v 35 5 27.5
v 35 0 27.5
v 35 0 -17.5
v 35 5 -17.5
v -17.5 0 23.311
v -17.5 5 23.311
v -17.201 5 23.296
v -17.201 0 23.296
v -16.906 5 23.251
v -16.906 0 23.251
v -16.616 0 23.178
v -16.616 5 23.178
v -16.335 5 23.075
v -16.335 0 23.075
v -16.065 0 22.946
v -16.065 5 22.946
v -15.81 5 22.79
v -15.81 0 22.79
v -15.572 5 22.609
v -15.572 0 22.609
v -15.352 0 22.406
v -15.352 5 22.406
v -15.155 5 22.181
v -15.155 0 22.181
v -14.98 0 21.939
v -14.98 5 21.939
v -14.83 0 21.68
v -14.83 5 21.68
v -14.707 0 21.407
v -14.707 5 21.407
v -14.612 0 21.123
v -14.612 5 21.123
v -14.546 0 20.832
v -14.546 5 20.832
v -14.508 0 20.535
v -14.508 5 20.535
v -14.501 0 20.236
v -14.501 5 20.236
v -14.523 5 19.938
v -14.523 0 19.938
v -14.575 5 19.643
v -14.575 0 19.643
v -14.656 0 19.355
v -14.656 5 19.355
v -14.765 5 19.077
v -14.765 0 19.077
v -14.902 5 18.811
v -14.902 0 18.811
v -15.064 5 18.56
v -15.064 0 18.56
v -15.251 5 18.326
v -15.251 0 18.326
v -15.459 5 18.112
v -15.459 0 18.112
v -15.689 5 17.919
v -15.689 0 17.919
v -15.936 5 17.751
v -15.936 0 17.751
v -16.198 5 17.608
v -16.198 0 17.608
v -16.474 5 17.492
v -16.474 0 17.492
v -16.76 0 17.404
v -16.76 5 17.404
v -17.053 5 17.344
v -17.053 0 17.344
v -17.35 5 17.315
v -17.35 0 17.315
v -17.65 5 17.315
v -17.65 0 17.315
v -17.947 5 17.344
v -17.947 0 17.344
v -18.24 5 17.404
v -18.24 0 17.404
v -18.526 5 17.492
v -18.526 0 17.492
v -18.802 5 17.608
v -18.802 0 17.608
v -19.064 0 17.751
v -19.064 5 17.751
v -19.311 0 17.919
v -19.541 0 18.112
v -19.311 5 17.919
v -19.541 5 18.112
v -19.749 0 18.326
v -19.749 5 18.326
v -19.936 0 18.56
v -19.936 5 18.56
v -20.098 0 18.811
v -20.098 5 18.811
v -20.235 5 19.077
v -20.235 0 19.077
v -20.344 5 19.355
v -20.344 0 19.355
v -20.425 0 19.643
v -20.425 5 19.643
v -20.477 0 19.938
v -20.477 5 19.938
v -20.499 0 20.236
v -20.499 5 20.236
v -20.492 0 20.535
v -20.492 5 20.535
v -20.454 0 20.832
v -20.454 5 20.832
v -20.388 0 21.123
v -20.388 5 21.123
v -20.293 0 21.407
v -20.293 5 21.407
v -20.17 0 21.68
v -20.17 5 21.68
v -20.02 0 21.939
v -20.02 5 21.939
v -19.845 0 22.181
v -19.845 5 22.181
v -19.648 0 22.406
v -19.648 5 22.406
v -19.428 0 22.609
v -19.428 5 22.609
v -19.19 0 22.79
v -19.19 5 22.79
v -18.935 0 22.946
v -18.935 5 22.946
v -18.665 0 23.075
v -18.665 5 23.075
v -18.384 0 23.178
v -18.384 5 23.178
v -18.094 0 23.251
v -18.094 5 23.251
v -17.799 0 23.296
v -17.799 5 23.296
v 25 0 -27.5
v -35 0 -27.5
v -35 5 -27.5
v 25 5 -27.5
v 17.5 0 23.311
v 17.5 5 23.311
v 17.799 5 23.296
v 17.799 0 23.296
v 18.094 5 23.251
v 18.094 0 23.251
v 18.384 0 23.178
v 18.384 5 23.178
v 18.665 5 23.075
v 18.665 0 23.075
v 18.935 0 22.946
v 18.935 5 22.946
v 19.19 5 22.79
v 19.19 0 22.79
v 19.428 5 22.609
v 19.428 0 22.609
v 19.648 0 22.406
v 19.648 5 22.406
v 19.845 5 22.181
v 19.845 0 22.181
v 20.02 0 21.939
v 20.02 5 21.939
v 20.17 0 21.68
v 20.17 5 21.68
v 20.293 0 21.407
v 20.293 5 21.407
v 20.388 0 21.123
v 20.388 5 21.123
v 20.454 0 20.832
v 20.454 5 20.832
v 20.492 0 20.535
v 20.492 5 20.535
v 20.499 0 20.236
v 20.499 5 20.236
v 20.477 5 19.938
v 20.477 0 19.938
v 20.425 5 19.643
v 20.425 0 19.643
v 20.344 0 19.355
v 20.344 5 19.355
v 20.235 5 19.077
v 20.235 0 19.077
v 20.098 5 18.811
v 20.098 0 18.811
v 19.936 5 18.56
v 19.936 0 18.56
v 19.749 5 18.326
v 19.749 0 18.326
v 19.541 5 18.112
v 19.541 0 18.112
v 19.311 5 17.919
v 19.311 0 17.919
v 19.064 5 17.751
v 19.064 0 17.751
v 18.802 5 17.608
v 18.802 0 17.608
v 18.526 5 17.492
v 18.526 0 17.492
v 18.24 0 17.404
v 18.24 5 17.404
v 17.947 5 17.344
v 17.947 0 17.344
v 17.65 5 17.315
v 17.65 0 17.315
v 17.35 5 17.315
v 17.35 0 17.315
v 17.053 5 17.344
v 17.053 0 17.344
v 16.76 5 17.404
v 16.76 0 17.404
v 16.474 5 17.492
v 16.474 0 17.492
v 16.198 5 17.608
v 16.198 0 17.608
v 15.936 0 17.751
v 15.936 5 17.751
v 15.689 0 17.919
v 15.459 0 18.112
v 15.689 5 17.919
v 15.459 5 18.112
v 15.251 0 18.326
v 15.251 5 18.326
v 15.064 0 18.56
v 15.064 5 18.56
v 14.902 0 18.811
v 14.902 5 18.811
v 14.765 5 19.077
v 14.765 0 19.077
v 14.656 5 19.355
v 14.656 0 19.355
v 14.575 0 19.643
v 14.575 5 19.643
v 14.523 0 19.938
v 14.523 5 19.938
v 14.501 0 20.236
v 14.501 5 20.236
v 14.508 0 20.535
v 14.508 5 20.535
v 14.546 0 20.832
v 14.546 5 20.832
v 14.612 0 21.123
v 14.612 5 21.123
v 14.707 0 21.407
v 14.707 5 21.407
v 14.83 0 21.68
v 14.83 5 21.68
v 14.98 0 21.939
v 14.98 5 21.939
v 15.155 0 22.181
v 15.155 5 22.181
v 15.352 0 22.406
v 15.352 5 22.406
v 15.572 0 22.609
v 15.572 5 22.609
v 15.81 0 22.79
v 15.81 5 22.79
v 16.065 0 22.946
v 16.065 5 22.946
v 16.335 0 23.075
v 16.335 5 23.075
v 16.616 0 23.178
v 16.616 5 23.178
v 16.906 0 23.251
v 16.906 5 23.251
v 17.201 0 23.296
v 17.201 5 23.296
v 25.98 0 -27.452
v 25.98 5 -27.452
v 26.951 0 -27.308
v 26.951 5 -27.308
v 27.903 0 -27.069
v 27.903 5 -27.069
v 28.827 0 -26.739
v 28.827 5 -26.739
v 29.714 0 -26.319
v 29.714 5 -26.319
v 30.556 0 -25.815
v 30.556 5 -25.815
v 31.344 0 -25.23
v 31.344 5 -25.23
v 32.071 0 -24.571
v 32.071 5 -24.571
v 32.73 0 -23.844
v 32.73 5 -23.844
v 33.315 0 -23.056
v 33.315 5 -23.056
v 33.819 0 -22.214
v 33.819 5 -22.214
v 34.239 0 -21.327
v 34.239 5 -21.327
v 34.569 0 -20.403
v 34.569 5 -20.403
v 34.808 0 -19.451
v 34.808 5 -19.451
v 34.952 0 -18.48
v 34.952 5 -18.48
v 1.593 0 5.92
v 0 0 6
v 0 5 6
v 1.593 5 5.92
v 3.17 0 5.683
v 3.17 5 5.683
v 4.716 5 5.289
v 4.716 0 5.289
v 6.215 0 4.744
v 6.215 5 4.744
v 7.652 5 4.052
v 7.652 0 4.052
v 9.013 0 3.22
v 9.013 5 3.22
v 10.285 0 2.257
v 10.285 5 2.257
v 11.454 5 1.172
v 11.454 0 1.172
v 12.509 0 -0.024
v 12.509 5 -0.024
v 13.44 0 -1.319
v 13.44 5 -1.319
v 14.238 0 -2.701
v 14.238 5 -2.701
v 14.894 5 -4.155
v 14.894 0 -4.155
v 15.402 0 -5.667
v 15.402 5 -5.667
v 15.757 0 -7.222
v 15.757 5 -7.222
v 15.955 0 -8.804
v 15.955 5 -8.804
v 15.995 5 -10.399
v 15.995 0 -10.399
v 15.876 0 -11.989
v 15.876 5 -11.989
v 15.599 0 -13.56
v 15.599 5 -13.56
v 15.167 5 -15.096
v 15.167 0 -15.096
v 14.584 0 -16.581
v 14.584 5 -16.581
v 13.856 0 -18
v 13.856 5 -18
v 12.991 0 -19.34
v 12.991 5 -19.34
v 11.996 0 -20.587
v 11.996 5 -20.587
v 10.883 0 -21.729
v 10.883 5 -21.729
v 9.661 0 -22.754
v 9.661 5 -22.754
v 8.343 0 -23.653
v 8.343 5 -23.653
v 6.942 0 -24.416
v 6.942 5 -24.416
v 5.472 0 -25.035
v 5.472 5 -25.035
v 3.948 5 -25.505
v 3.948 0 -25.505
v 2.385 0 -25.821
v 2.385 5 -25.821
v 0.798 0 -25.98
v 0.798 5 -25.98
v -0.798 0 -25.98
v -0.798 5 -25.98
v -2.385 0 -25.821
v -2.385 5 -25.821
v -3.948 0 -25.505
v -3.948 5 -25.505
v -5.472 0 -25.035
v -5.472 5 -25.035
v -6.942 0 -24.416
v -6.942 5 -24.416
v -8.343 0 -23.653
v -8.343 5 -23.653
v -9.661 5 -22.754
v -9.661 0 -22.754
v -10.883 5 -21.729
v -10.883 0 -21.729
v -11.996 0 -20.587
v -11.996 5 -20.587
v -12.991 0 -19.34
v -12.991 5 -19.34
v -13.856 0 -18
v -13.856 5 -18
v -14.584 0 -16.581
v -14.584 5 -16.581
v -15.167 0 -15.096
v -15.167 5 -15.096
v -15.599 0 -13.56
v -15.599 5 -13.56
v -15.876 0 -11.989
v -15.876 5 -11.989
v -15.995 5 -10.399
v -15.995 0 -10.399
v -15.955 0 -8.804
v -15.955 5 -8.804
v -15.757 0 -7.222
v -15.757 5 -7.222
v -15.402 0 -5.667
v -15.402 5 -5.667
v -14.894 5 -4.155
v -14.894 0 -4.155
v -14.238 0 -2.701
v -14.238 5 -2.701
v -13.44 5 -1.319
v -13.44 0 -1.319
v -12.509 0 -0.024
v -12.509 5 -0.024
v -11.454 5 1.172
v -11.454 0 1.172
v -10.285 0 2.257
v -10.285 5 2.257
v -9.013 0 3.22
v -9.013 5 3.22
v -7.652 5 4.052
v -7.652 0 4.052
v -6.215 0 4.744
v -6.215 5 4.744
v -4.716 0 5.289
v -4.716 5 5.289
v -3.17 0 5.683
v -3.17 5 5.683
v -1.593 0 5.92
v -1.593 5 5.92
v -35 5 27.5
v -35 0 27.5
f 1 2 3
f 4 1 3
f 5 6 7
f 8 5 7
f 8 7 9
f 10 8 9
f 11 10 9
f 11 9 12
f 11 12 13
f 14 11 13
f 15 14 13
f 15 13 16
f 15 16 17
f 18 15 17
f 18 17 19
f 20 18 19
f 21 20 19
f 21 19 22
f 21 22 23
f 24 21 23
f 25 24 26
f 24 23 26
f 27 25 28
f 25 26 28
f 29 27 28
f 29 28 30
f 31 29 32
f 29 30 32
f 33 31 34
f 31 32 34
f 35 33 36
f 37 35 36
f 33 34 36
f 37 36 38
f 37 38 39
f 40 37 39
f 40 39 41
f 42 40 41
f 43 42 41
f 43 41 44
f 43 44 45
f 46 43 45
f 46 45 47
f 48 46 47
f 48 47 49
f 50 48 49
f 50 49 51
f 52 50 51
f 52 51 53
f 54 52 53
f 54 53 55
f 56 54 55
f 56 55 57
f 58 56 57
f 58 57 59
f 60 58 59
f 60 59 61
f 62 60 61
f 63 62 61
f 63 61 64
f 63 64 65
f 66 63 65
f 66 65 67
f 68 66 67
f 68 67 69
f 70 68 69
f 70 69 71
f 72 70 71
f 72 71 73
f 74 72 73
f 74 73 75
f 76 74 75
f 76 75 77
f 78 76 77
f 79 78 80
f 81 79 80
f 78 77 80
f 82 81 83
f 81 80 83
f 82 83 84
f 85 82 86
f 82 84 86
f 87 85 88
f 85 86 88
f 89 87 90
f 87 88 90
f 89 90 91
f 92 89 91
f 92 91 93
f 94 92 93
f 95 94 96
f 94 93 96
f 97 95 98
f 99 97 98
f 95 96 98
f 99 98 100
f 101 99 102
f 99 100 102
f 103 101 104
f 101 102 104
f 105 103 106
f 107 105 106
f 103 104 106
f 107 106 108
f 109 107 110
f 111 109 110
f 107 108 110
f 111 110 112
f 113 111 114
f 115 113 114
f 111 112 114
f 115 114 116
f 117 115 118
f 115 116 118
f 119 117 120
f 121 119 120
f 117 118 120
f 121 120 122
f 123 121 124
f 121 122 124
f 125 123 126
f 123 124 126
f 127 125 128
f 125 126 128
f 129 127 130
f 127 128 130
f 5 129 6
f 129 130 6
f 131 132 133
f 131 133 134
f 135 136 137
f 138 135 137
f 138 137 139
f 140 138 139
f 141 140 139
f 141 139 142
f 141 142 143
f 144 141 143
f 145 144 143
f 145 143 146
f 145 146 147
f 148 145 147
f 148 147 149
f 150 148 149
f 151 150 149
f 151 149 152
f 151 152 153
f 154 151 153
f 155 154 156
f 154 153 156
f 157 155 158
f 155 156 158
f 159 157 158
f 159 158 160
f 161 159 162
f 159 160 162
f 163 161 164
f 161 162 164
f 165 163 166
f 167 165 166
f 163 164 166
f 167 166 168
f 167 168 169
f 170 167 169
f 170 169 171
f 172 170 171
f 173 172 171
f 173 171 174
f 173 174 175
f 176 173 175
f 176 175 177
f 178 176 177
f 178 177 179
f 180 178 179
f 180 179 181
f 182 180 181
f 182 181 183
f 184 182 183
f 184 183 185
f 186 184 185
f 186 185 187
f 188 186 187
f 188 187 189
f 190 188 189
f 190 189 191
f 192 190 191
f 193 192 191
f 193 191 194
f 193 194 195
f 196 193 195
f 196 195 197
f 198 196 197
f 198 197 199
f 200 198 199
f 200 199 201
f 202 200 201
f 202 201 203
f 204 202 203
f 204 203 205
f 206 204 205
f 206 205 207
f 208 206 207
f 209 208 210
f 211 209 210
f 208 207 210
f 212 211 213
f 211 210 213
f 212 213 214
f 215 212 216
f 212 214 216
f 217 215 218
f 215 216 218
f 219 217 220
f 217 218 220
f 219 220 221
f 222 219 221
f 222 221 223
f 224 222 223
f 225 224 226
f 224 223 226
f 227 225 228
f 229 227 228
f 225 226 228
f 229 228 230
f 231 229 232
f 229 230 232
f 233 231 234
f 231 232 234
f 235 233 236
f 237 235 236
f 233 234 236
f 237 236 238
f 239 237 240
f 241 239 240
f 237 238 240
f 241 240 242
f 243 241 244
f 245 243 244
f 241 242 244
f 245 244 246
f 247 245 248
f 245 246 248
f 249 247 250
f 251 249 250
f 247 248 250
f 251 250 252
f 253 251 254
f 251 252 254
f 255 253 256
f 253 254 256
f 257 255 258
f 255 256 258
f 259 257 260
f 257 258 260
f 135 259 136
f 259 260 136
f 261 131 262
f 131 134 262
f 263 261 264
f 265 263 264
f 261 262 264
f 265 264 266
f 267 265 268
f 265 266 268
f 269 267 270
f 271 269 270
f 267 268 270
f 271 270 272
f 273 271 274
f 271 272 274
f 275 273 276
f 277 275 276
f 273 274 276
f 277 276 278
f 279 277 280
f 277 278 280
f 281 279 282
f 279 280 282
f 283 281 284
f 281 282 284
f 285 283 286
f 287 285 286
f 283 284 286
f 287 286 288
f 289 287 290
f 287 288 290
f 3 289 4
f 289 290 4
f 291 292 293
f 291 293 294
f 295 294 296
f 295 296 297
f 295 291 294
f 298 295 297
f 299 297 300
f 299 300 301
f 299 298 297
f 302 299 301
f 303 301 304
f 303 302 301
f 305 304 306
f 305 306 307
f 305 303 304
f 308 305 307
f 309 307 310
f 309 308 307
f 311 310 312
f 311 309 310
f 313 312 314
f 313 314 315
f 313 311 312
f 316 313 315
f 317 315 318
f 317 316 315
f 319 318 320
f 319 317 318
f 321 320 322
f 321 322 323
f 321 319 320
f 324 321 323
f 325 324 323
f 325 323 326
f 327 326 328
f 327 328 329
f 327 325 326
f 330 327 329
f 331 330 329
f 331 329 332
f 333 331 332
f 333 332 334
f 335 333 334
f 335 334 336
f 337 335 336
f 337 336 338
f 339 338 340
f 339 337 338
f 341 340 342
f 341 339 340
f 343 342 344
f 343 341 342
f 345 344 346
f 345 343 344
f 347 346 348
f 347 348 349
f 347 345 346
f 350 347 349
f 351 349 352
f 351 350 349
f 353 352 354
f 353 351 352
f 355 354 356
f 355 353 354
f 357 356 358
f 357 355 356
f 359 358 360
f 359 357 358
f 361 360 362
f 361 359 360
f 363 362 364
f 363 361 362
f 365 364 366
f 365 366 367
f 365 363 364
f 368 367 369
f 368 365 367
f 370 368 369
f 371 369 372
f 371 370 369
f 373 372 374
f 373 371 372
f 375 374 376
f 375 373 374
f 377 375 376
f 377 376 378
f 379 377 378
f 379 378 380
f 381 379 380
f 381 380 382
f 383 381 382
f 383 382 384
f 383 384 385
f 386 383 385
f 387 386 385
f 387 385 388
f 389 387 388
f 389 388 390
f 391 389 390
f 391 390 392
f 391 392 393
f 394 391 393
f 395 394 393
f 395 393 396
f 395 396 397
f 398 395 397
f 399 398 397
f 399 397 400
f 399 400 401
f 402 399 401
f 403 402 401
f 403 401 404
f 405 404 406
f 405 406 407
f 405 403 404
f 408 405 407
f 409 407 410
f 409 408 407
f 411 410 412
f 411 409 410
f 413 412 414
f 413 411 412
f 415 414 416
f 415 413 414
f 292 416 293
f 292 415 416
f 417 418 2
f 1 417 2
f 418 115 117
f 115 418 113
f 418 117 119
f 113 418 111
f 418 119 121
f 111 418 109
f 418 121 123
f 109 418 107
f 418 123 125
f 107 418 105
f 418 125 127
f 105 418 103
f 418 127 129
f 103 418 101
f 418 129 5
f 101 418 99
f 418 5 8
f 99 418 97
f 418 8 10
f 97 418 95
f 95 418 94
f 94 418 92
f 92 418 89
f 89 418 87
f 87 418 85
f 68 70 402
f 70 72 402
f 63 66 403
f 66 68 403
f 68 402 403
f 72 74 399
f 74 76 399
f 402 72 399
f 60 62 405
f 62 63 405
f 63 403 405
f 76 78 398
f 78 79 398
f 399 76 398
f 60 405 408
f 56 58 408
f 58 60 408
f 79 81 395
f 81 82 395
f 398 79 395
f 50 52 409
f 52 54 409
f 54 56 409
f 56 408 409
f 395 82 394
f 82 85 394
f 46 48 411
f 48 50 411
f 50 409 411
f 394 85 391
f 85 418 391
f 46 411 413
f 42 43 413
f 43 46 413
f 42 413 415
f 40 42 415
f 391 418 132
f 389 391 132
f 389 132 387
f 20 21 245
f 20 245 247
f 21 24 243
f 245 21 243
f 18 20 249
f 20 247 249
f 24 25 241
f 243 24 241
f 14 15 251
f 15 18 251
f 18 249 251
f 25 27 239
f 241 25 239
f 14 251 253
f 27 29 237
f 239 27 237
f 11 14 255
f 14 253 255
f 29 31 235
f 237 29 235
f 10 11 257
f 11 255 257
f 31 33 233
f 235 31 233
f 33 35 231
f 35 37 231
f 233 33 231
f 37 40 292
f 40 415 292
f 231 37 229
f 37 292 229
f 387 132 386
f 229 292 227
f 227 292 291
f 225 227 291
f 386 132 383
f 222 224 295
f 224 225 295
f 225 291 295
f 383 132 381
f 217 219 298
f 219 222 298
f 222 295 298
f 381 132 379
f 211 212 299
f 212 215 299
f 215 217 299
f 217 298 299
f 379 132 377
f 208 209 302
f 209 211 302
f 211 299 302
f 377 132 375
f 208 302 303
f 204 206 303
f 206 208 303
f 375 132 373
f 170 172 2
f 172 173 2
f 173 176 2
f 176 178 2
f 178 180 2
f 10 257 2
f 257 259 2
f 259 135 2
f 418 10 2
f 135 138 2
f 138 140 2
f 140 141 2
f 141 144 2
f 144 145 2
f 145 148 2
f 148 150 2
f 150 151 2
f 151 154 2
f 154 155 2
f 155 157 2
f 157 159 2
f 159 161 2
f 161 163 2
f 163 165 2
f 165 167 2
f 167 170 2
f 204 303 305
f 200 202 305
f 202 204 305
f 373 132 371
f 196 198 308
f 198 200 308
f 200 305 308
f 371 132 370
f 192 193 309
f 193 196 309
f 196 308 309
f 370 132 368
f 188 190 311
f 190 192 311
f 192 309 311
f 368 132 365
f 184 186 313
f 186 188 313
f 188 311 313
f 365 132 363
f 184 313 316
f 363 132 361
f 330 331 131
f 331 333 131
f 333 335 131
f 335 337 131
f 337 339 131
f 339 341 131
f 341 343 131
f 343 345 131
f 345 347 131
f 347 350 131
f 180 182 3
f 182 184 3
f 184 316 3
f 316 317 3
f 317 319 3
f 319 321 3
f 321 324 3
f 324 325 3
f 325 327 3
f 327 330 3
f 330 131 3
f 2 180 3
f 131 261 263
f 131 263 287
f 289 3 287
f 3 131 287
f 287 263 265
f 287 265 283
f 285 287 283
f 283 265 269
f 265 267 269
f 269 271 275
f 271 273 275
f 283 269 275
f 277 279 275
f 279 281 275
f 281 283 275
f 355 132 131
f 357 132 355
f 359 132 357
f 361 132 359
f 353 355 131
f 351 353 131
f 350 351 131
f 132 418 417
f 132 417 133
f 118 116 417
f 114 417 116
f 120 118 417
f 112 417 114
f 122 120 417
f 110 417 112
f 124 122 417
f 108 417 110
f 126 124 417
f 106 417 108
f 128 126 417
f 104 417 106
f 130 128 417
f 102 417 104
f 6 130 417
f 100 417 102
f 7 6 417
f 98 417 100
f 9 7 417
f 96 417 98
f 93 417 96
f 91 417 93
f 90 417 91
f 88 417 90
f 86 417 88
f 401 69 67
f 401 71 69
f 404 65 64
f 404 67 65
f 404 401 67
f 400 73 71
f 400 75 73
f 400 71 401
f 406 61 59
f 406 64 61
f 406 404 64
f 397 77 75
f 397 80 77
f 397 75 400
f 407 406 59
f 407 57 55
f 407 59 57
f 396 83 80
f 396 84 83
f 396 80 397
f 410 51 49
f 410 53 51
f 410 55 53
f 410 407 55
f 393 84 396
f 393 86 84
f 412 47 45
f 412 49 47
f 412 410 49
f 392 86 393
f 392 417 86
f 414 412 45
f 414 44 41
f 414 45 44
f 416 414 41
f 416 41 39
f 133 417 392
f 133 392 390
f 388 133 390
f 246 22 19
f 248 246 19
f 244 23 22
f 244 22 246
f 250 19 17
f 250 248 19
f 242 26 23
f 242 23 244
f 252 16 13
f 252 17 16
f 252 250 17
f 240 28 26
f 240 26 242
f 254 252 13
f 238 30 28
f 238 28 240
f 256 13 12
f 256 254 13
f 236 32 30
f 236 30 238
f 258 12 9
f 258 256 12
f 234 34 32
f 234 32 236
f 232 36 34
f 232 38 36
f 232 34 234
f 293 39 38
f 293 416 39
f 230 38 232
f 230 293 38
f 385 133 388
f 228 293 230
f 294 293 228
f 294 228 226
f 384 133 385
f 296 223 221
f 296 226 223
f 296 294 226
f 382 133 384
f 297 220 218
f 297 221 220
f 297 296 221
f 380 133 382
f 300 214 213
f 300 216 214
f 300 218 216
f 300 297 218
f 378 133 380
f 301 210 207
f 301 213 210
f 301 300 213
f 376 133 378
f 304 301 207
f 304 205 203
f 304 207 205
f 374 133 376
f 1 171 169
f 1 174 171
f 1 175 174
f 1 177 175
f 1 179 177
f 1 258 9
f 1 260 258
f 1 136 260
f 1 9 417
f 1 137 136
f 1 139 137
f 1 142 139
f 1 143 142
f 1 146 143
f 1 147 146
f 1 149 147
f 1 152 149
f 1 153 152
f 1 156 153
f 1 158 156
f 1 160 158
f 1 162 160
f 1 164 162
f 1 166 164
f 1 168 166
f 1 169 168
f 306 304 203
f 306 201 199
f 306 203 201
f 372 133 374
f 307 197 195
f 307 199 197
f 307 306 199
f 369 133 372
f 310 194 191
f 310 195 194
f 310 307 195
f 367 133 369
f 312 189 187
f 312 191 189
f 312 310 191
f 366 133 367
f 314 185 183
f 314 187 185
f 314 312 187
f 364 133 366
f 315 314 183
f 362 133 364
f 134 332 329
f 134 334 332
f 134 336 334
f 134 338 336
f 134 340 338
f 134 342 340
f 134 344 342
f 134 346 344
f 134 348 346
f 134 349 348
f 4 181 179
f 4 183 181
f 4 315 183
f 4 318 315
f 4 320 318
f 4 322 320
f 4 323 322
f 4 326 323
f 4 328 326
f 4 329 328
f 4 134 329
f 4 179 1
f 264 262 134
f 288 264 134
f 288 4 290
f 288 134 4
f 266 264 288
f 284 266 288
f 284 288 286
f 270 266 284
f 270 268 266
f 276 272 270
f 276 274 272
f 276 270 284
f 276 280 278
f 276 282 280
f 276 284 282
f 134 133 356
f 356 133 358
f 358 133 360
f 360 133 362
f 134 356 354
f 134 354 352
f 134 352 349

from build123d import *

# Parameters (mm, degrees)
SKETCH1_W           = 70
SKETCH1_H           = 55
SKETCH1_R           = 16
BOSS_EXTRUDE1_DEPTH = 5
SKETCH2_R           = 3
CUT_EXTRUDE1_DEPTH  = 45.791182168
FILLET1_R           = 10


with BuildPart() as part:
    # Sketch1 → Boss-Extrude1 (new body)
    with BuildSketch(Plane(origin=(0, 0, 0), x_dir=(1, 0, 0), z_dir=(0, 1, 0))):
        Rectangle(SKETCH1_W, SKETCH1_H)
        with Locations(Location((0, 10, 0), (0, 0, 270))):
            Circle(SKETCH1_R, mode=Mode.SUBTRACT)
    extrude(amount=BOSS_EXTRUDE1_DEPTH)

    # Sketch2 → Cut-Extrude1 (cut, through all)
    with BuildSketch(Plane(origin=(0, 5, 0), x_dir=(1, 0, 0), z_dir=(0, 1, 0))):
        with Locations(Location((-17.5, -20.310889132, 0), (0, 0, 270))):
            Circle(SKETCH2_R)
        with Locations(Location((17.5, -20.310889132, 0), (0, 0, 270))):
            Circle(SKETCH2_R)
    extrude(amount=-CUT_EXTRUDE1_DEPTH, mode=Mode.SUBTRACT)

    # Fillet1
    fillet1_edges = [part.edges().sort_by_distance(p)[0] for p in [
        (35, 2.5, -27.5),
    ]]
    fillet(fillet1_edges, radius=FILLET1_R)


solid = part.part
